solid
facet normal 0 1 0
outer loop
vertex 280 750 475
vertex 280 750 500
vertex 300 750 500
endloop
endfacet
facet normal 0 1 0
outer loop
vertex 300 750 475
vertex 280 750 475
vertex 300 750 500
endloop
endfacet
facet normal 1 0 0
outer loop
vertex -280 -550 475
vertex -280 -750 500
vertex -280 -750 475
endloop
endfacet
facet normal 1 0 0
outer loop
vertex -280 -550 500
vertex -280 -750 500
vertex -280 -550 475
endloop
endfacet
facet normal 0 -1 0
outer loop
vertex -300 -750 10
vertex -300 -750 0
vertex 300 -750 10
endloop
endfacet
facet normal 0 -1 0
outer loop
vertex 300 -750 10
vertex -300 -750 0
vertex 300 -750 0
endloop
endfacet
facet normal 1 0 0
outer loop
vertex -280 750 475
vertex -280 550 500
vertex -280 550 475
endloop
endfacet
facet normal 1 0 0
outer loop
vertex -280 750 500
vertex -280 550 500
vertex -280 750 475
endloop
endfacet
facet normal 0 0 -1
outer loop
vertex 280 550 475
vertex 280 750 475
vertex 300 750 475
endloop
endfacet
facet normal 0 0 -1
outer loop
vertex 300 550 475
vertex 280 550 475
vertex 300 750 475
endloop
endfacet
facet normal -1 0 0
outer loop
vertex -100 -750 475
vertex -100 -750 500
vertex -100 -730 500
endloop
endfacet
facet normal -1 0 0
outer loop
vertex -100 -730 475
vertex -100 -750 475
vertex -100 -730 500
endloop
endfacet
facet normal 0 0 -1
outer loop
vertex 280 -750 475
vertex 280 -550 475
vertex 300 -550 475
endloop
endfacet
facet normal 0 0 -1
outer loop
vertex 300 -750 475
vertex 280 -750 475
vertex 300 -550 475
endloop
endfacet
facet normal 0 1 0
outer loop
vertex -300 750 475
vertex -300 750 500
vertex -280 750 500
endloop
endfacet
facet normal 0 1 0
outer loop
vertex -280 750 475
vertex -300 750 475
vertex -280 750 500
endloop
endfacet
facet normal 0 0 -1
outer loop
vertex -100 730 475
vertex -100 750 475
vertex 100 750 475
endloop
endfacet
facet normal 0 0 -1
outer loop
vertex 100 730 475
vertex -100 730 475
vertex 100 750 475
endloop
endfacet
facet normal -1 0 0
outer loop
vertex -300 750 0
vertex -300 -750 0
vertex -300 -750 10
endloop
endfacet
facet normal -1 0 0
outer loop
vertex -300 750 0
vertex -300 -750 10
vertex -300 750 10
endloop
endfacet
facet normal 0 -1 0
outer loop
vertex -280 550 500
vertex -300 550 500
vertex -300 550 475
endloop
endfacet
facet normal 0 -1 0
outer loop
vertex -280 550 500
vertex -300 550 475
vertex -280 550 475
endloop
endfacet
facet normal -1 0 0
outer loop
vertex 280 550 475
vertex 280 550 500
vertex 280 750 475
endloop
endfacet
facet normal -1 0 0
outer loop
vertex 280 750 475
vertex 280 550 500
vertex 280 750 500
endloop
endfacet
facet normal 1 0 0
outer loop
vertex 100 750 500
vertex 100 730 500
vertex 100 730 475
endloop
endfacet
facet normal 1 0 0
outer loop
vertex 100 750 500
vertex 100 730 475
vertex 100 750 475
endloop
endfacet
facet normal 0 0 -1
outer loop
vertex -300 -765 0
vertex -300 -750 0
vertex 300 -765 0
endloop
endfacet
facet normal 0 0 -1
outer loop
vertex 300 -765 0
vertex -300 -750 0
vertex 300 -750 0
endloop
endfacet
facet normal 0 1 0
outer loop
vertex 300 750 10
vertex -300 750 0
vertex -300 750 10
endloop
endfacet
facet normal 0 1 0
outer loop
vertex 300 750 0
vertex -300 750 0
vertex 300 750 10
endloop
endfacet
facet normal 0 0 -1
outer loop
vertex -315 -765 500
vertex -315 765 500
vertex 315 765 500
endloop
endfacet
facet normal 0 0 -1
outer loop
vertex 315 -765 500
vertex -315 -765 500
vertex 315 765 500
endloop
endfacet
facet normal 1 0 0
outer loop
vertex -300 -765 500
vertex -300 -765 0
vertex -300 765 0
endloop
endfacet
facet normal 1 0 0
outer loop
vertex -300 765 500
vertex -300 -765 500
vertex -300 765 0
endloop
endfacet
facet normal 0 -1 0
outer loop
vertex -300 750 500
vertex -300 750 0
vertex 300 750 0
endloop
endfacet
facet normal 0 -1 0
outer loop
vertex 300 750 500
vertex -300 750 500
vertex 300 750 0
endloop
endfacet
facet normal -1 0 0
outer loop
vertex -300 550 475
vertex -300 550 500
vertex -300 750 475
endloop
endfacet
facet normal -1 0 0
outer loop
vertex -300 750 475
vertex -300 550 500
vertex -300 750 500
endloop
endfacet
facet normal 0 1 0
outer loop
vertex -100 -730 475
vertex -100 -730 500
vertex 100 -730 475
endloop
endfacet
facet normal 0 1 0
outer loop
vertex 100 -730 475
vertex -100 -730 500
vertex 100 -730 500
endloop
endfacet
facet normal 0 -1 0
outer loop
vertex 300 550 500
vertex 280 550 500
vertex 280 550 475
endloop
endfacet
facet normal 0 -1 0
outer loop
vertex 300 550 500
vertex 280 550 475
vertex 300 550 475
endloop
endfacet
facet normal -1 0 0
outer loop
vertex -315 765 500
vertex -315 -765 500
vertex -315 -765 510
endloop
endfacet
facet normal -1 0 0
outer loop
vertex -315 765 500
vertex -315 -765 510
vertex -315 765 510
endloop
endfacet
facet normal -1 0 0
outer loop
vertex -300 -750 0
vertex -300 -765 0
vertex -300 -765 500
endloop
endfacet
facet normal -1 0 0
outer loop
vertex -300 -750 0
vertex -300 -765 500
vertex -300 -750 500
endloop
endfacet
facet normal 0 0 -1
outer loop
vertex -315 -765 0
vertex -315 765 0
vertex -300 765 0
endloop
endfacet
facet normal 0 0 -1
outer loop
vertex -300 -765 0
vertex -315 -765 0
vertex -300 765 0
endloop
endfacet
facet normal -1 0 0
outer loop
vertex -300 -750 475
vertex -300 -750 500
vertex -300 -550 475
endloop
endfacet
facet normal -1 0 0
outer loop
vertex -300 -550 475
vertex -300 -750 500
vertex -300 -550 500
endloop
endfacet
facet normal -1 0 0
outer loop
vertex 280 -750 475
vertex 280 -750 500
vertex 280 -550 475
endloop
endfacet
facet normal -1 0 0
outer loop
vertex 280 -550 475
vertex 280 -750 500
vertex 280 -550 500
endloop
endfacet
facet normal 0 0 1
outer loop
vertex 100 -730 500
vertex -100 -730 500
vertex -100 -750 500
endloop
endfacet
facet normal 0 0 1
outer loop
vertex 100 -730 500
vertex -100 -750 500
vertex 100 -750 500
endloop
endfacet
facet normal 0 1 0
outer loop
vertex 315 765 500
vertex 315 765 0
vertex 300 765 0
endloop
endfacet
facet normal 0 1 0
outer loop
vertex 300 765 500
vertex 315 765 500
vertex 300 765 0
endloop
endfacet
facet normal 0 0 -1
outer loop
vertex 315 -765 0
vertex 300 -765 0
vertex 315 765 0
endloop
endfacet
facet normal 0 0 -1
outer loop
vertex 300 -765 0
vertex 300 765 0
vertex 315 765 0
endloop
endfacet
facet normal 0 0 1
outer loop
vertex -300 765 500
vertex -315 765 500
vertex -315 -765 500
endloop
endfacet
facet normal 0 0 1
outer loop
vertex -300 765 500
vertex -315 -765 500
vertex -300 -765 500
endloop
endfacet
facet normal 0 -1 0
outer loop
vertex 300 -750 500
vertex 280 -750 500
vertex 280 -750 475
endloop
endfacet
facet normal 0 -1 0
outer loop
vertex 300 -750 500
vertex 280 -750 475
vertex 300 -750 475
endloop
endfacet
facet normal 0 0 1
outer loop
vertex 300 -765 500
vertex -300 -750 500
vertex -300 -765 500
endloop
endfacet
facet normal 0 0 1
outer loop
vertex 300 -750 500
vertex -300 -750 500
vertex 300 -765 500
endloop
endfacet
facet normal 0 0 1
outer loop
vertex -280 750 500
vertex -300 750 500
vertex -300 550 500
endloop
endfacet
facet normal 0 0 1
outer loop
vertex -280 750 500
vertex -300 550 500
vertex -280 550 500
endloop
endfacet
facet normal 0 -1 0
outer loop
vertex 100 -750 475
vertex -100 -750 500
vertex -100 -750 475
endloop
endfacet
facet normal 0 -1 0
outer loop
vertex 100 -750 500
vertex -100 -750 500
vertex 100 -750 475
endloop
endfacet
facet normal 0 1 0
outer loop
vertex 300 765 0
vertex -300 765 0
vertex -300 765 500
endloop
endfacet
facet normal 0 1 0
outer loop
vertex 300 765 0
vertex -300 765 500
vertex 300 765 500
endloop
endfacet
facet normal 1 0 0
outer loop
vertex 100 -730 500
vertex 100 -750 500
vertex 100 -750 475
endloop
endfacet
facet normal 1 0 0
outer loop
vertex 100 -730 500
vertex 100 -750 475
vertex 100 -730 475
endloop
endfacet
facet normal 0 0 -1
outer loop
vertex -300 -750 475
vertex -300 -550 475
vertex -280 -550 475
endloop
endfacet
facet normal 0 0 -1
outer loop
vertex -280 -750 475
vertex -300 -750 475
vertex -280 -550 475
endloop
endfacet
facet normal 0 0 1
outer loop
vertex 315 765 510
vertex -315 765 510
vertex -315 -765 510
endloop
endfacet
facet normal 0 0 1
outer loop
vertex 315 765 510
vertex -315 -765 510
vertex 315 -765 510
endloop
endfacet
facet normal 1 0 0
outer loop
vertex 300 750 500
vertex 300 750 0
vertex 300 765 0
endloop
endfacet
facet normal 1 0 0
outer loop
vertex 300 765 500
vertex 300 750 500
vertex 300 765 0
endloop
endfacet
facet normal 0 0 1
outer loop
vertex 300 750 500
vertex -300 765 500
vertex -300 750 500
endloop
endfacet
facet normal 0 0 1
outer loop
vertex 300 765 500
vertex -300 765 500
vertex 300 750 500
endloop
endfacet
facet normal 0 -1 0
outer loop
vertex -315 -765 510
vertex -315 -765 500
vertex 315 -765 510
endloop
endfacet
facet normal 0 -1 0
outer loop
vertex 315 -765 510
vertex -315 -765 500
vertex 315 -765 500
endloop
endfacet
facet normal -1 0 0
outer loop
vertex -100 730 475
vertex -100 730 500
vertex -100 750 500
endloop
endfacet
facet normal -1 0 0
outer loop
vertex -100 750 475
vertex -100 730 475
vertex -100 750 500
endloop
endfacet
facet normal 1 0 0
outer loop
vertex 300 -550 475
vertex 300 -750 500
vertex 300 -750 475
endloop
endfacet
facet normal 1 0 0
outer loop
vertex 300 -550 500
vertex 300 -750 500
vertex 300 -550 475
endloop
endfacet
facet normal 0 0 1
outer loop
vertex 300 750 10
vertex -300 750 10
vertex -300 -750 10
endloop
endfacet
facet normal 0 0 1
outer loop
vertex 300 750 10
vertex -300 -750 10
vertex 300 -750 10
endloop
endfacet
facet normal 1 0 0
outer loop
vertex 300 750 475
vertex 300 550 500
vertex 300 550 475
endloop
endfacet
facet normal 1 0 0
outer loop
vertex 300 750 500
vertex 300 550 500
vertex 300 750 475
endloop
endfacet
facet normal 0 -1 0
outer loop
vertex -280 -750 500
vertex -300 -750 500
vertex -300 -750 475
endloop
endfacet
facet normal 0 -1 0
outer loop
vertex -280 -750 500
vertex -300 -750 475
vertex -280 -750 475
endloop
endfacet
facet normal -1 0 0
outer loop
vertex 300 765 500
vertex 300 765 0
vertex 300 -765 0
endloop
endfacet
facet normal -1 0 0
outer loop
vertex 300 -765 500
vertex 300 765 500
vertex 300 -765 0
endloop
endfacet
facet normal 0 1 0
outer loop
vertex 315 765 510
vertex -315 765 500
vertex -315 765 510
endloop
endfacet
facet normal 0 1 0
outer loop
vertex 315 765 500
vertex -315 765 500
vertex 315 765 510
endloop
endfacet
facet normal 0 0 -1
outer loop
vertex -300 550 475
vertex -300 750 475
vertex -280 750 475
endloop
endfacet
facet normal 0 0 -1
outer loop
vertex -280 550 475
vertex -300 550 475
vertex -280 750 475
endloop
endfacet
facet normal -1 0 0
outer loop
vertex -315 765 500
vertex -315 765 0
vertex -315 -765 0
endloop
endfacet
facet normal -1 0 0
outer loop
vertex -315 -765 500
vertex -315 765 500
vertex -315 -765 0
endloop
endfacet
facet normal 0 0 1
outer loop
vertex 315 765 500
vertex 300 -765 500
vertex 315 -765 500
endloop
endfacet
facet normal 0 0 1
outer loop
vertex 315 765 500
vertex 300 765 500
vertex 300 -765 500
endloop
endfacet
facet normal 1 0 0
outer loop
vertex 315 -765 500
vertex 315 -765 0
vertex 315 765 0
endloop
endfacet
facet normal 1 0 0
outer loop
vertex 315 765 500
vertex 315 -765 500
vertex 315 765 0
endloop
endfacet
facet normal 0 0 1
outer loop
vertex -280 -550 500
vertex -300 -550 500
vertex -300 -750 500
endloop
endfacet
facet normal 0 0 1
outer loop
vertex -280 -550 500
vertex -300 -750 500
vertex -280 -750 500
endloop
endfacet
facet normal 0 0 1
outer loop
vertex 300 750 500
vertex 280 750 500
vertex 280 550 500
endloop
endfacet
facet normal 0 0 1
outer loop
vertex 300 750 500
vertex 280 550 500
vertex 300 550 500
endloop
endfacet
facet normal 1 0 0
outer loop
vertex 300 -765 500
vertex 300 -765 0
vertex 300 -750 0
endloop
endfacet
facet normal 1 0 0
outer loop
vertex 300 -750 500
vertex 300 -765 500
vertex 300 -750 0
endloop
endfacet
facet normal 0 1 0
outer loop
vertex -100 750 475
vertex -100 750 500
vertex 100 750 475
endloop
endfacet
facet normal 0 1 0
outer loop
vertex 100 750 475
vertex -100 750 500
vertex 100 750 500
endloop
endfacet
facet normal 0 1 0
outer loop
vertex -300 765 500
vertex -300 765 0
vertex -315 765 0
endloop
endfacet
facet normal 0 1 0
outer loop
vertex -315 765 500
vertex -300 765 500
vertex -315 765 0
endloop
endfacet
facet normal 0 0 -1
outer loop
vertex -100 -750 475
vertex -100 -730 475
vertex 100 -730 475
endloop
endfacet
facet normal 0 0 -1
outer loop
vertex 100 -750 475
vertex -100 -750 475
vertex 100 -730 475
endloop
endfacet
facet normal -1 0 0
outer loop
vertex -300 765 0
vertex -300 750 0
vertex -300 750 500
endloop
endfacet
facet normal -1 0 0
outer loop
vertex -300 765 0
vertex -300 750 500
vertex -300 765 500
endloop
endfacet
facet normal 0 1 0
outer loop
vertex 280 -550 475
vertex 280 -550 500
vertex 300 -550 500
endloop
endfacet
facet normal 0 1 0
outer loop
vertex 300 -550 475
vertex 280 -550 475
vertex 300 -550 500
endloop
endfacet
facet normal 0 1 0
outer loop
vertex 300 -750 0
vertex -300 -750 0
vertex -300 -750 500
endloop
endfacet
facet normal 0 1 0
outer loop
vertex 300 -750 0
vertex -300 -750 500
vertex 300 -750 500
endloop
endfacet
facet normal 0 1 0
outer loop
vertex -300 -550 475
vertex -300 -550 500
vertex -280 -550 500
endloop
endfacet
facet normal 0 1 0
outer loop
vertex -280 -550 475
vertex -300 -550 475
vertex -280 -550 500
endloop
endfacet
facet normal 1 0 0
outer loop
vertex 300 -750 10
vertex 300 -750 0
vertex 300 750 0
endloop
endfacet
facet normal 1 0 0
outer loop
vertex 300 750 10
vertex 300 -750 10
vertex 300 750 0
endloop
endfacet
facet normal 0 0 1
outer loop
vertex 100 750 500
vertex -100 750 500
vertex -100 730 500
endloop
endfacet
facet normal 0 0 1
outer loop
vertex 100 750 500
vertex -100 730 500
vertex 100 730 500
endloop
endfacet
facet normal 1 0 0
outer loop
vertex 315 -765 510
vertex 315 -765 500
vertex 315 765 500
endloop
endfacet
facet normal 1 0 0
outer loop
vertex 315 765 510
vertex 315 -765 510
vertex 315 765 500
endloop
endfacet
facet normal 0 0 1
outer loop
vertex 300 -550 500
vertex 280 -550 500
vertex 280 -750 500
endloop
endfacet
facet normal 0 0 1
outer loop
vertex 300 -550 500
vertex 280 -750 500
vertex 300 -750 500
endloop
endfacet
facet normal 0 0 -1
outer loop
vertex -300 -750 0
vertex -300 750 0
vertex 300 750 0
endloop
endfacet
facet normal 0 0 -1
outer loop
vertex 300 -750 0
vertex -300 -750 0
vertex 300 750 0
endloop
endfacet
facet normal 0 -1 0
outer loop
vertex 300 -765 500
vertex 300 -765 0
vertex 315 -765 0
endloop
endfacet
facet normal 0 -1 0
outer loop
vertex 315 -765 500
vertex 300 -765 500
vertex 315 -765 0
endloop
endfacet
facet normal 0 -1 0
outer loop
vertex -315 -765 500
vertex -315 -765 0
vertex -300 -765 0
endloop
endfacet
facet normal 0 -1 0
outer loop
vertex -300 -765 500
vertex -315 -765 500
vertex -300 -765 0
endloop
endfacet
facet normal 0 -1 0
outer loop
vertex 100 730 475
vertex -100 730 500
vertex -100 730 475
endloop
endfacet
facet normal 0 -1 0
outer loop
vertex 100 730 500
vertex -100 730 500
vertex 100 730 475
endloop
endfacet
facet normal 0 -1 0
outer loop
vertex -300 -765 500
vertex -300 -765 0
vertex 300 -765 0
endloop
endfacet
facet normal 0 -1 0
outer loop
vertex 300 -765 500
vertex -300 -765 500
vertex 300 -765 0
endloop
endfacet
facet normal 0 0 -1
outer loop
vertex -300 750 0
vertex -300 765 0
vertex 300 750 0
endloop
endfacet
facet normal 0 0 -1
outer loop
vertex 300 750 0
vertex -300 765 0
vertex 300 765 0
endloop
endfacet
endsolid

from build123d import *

# Parameters (mm, degrees)
F1_W      = 600
F1_H      = 1500
F2_DEPTH  = 10
F1_H_2    = 15
F3_DEPTH  = 500
F4_DEPTH  = 500
F5_DEPTH  = 500
F6_DEPTH  = 500
F7_W      = 630
F7_H      = 1530
F8_DEPTH  = 10
F9_W      = 20
F9_H      = 200
F10_DEPTH = 25
F9_W_2    = 200
F9_H_2    = 20
F11_DEPTH = 25


with BuildPart() as f2:
    # F1 (on Top) → F2 (new body)
    with BuildSketch(Plane.XY):
        Rectangle(F1_W, F1_H)
    extrude(amount=F2_DEPTH)


with BuildPart() as f3:
    # F1 (on Top) → F3 (new body, through all)
    with BuildSketch(Plane.XY):
        with Locations((0, 757.5)):
            Rectangle(F1_W, F1_H_2)
    extrude(amount=F3_DEPTH)


with BuildPart() as f4:
    # F1 (on Top) → F4 (new body, through all)
    with BuildSketch(Plane.XY):
        with Locations((0, -757.5)):
            Rectangle(F1_W, F1_H_2)
    extrude(amount=F4_DEPTH)


with BuildPart() as f5:
    # F1 (on Top) → F5 (new body, through all)
    with BuildSketch(Plane.XY):
        Polygon((300, 750), (300, -750), (300, -765), (315, -765), (315, 765), (300, 765), align=None)
    extrude(amount=F5_DEPTH)


with BuildPart() as f6:
    # F1 (on Top) → F6 (new body, through all)
    with BuildSketch(Plane.XY):
        Polygon((-300, -765), (-300, -750), (-300, 750), (-300, 765), (-315, 765), (-315, -765), align=None)
    extrude(amount=F6_DEPTH)


with BuildPart() as f8:
    # F7 (on offset) → F8 (new body)
    with BuildSketch(Plane.XY.offset(500)):
        Rectangle(F7_W, F7_H)
    extrude(amount=F8_DEPTH)


with BuildPart() as f10:
    # F9 (on offset) → F10 (new body)
    with BuildSketch(Plane.XY.offset(500)):
        with Locations((290, -650)):
            Rectangle(F9_W, F9_H)
    extrude(amount=-F10_DEPTH)


with BuildPart() as f11:
    # F9 (on offset) → F11 (new body)
    with BuildSketch(Plane.XY.offset(500)):
        with Locations((0, -740)):
            Rectangle(F9_W_2, F9_H_2)
        with Locations((-290, -650)):
            Rectangle(F9_W, F9_H)
        with Locations((290, 650)):
            Rectangle(F9_W, F9_H)
        with Locations((0, 740)):
            Rectangle(F9_W_2, F9_H_2)
        with Locations((-290, 650)):
            Rectangle(F9_W, F9_H)
    extrude(amount=-F11_DEPTH)


solid = Compound([f2.part, f3.part, f4.part, f5.part, f6.part, f8.part, f10.part, f11.part])
